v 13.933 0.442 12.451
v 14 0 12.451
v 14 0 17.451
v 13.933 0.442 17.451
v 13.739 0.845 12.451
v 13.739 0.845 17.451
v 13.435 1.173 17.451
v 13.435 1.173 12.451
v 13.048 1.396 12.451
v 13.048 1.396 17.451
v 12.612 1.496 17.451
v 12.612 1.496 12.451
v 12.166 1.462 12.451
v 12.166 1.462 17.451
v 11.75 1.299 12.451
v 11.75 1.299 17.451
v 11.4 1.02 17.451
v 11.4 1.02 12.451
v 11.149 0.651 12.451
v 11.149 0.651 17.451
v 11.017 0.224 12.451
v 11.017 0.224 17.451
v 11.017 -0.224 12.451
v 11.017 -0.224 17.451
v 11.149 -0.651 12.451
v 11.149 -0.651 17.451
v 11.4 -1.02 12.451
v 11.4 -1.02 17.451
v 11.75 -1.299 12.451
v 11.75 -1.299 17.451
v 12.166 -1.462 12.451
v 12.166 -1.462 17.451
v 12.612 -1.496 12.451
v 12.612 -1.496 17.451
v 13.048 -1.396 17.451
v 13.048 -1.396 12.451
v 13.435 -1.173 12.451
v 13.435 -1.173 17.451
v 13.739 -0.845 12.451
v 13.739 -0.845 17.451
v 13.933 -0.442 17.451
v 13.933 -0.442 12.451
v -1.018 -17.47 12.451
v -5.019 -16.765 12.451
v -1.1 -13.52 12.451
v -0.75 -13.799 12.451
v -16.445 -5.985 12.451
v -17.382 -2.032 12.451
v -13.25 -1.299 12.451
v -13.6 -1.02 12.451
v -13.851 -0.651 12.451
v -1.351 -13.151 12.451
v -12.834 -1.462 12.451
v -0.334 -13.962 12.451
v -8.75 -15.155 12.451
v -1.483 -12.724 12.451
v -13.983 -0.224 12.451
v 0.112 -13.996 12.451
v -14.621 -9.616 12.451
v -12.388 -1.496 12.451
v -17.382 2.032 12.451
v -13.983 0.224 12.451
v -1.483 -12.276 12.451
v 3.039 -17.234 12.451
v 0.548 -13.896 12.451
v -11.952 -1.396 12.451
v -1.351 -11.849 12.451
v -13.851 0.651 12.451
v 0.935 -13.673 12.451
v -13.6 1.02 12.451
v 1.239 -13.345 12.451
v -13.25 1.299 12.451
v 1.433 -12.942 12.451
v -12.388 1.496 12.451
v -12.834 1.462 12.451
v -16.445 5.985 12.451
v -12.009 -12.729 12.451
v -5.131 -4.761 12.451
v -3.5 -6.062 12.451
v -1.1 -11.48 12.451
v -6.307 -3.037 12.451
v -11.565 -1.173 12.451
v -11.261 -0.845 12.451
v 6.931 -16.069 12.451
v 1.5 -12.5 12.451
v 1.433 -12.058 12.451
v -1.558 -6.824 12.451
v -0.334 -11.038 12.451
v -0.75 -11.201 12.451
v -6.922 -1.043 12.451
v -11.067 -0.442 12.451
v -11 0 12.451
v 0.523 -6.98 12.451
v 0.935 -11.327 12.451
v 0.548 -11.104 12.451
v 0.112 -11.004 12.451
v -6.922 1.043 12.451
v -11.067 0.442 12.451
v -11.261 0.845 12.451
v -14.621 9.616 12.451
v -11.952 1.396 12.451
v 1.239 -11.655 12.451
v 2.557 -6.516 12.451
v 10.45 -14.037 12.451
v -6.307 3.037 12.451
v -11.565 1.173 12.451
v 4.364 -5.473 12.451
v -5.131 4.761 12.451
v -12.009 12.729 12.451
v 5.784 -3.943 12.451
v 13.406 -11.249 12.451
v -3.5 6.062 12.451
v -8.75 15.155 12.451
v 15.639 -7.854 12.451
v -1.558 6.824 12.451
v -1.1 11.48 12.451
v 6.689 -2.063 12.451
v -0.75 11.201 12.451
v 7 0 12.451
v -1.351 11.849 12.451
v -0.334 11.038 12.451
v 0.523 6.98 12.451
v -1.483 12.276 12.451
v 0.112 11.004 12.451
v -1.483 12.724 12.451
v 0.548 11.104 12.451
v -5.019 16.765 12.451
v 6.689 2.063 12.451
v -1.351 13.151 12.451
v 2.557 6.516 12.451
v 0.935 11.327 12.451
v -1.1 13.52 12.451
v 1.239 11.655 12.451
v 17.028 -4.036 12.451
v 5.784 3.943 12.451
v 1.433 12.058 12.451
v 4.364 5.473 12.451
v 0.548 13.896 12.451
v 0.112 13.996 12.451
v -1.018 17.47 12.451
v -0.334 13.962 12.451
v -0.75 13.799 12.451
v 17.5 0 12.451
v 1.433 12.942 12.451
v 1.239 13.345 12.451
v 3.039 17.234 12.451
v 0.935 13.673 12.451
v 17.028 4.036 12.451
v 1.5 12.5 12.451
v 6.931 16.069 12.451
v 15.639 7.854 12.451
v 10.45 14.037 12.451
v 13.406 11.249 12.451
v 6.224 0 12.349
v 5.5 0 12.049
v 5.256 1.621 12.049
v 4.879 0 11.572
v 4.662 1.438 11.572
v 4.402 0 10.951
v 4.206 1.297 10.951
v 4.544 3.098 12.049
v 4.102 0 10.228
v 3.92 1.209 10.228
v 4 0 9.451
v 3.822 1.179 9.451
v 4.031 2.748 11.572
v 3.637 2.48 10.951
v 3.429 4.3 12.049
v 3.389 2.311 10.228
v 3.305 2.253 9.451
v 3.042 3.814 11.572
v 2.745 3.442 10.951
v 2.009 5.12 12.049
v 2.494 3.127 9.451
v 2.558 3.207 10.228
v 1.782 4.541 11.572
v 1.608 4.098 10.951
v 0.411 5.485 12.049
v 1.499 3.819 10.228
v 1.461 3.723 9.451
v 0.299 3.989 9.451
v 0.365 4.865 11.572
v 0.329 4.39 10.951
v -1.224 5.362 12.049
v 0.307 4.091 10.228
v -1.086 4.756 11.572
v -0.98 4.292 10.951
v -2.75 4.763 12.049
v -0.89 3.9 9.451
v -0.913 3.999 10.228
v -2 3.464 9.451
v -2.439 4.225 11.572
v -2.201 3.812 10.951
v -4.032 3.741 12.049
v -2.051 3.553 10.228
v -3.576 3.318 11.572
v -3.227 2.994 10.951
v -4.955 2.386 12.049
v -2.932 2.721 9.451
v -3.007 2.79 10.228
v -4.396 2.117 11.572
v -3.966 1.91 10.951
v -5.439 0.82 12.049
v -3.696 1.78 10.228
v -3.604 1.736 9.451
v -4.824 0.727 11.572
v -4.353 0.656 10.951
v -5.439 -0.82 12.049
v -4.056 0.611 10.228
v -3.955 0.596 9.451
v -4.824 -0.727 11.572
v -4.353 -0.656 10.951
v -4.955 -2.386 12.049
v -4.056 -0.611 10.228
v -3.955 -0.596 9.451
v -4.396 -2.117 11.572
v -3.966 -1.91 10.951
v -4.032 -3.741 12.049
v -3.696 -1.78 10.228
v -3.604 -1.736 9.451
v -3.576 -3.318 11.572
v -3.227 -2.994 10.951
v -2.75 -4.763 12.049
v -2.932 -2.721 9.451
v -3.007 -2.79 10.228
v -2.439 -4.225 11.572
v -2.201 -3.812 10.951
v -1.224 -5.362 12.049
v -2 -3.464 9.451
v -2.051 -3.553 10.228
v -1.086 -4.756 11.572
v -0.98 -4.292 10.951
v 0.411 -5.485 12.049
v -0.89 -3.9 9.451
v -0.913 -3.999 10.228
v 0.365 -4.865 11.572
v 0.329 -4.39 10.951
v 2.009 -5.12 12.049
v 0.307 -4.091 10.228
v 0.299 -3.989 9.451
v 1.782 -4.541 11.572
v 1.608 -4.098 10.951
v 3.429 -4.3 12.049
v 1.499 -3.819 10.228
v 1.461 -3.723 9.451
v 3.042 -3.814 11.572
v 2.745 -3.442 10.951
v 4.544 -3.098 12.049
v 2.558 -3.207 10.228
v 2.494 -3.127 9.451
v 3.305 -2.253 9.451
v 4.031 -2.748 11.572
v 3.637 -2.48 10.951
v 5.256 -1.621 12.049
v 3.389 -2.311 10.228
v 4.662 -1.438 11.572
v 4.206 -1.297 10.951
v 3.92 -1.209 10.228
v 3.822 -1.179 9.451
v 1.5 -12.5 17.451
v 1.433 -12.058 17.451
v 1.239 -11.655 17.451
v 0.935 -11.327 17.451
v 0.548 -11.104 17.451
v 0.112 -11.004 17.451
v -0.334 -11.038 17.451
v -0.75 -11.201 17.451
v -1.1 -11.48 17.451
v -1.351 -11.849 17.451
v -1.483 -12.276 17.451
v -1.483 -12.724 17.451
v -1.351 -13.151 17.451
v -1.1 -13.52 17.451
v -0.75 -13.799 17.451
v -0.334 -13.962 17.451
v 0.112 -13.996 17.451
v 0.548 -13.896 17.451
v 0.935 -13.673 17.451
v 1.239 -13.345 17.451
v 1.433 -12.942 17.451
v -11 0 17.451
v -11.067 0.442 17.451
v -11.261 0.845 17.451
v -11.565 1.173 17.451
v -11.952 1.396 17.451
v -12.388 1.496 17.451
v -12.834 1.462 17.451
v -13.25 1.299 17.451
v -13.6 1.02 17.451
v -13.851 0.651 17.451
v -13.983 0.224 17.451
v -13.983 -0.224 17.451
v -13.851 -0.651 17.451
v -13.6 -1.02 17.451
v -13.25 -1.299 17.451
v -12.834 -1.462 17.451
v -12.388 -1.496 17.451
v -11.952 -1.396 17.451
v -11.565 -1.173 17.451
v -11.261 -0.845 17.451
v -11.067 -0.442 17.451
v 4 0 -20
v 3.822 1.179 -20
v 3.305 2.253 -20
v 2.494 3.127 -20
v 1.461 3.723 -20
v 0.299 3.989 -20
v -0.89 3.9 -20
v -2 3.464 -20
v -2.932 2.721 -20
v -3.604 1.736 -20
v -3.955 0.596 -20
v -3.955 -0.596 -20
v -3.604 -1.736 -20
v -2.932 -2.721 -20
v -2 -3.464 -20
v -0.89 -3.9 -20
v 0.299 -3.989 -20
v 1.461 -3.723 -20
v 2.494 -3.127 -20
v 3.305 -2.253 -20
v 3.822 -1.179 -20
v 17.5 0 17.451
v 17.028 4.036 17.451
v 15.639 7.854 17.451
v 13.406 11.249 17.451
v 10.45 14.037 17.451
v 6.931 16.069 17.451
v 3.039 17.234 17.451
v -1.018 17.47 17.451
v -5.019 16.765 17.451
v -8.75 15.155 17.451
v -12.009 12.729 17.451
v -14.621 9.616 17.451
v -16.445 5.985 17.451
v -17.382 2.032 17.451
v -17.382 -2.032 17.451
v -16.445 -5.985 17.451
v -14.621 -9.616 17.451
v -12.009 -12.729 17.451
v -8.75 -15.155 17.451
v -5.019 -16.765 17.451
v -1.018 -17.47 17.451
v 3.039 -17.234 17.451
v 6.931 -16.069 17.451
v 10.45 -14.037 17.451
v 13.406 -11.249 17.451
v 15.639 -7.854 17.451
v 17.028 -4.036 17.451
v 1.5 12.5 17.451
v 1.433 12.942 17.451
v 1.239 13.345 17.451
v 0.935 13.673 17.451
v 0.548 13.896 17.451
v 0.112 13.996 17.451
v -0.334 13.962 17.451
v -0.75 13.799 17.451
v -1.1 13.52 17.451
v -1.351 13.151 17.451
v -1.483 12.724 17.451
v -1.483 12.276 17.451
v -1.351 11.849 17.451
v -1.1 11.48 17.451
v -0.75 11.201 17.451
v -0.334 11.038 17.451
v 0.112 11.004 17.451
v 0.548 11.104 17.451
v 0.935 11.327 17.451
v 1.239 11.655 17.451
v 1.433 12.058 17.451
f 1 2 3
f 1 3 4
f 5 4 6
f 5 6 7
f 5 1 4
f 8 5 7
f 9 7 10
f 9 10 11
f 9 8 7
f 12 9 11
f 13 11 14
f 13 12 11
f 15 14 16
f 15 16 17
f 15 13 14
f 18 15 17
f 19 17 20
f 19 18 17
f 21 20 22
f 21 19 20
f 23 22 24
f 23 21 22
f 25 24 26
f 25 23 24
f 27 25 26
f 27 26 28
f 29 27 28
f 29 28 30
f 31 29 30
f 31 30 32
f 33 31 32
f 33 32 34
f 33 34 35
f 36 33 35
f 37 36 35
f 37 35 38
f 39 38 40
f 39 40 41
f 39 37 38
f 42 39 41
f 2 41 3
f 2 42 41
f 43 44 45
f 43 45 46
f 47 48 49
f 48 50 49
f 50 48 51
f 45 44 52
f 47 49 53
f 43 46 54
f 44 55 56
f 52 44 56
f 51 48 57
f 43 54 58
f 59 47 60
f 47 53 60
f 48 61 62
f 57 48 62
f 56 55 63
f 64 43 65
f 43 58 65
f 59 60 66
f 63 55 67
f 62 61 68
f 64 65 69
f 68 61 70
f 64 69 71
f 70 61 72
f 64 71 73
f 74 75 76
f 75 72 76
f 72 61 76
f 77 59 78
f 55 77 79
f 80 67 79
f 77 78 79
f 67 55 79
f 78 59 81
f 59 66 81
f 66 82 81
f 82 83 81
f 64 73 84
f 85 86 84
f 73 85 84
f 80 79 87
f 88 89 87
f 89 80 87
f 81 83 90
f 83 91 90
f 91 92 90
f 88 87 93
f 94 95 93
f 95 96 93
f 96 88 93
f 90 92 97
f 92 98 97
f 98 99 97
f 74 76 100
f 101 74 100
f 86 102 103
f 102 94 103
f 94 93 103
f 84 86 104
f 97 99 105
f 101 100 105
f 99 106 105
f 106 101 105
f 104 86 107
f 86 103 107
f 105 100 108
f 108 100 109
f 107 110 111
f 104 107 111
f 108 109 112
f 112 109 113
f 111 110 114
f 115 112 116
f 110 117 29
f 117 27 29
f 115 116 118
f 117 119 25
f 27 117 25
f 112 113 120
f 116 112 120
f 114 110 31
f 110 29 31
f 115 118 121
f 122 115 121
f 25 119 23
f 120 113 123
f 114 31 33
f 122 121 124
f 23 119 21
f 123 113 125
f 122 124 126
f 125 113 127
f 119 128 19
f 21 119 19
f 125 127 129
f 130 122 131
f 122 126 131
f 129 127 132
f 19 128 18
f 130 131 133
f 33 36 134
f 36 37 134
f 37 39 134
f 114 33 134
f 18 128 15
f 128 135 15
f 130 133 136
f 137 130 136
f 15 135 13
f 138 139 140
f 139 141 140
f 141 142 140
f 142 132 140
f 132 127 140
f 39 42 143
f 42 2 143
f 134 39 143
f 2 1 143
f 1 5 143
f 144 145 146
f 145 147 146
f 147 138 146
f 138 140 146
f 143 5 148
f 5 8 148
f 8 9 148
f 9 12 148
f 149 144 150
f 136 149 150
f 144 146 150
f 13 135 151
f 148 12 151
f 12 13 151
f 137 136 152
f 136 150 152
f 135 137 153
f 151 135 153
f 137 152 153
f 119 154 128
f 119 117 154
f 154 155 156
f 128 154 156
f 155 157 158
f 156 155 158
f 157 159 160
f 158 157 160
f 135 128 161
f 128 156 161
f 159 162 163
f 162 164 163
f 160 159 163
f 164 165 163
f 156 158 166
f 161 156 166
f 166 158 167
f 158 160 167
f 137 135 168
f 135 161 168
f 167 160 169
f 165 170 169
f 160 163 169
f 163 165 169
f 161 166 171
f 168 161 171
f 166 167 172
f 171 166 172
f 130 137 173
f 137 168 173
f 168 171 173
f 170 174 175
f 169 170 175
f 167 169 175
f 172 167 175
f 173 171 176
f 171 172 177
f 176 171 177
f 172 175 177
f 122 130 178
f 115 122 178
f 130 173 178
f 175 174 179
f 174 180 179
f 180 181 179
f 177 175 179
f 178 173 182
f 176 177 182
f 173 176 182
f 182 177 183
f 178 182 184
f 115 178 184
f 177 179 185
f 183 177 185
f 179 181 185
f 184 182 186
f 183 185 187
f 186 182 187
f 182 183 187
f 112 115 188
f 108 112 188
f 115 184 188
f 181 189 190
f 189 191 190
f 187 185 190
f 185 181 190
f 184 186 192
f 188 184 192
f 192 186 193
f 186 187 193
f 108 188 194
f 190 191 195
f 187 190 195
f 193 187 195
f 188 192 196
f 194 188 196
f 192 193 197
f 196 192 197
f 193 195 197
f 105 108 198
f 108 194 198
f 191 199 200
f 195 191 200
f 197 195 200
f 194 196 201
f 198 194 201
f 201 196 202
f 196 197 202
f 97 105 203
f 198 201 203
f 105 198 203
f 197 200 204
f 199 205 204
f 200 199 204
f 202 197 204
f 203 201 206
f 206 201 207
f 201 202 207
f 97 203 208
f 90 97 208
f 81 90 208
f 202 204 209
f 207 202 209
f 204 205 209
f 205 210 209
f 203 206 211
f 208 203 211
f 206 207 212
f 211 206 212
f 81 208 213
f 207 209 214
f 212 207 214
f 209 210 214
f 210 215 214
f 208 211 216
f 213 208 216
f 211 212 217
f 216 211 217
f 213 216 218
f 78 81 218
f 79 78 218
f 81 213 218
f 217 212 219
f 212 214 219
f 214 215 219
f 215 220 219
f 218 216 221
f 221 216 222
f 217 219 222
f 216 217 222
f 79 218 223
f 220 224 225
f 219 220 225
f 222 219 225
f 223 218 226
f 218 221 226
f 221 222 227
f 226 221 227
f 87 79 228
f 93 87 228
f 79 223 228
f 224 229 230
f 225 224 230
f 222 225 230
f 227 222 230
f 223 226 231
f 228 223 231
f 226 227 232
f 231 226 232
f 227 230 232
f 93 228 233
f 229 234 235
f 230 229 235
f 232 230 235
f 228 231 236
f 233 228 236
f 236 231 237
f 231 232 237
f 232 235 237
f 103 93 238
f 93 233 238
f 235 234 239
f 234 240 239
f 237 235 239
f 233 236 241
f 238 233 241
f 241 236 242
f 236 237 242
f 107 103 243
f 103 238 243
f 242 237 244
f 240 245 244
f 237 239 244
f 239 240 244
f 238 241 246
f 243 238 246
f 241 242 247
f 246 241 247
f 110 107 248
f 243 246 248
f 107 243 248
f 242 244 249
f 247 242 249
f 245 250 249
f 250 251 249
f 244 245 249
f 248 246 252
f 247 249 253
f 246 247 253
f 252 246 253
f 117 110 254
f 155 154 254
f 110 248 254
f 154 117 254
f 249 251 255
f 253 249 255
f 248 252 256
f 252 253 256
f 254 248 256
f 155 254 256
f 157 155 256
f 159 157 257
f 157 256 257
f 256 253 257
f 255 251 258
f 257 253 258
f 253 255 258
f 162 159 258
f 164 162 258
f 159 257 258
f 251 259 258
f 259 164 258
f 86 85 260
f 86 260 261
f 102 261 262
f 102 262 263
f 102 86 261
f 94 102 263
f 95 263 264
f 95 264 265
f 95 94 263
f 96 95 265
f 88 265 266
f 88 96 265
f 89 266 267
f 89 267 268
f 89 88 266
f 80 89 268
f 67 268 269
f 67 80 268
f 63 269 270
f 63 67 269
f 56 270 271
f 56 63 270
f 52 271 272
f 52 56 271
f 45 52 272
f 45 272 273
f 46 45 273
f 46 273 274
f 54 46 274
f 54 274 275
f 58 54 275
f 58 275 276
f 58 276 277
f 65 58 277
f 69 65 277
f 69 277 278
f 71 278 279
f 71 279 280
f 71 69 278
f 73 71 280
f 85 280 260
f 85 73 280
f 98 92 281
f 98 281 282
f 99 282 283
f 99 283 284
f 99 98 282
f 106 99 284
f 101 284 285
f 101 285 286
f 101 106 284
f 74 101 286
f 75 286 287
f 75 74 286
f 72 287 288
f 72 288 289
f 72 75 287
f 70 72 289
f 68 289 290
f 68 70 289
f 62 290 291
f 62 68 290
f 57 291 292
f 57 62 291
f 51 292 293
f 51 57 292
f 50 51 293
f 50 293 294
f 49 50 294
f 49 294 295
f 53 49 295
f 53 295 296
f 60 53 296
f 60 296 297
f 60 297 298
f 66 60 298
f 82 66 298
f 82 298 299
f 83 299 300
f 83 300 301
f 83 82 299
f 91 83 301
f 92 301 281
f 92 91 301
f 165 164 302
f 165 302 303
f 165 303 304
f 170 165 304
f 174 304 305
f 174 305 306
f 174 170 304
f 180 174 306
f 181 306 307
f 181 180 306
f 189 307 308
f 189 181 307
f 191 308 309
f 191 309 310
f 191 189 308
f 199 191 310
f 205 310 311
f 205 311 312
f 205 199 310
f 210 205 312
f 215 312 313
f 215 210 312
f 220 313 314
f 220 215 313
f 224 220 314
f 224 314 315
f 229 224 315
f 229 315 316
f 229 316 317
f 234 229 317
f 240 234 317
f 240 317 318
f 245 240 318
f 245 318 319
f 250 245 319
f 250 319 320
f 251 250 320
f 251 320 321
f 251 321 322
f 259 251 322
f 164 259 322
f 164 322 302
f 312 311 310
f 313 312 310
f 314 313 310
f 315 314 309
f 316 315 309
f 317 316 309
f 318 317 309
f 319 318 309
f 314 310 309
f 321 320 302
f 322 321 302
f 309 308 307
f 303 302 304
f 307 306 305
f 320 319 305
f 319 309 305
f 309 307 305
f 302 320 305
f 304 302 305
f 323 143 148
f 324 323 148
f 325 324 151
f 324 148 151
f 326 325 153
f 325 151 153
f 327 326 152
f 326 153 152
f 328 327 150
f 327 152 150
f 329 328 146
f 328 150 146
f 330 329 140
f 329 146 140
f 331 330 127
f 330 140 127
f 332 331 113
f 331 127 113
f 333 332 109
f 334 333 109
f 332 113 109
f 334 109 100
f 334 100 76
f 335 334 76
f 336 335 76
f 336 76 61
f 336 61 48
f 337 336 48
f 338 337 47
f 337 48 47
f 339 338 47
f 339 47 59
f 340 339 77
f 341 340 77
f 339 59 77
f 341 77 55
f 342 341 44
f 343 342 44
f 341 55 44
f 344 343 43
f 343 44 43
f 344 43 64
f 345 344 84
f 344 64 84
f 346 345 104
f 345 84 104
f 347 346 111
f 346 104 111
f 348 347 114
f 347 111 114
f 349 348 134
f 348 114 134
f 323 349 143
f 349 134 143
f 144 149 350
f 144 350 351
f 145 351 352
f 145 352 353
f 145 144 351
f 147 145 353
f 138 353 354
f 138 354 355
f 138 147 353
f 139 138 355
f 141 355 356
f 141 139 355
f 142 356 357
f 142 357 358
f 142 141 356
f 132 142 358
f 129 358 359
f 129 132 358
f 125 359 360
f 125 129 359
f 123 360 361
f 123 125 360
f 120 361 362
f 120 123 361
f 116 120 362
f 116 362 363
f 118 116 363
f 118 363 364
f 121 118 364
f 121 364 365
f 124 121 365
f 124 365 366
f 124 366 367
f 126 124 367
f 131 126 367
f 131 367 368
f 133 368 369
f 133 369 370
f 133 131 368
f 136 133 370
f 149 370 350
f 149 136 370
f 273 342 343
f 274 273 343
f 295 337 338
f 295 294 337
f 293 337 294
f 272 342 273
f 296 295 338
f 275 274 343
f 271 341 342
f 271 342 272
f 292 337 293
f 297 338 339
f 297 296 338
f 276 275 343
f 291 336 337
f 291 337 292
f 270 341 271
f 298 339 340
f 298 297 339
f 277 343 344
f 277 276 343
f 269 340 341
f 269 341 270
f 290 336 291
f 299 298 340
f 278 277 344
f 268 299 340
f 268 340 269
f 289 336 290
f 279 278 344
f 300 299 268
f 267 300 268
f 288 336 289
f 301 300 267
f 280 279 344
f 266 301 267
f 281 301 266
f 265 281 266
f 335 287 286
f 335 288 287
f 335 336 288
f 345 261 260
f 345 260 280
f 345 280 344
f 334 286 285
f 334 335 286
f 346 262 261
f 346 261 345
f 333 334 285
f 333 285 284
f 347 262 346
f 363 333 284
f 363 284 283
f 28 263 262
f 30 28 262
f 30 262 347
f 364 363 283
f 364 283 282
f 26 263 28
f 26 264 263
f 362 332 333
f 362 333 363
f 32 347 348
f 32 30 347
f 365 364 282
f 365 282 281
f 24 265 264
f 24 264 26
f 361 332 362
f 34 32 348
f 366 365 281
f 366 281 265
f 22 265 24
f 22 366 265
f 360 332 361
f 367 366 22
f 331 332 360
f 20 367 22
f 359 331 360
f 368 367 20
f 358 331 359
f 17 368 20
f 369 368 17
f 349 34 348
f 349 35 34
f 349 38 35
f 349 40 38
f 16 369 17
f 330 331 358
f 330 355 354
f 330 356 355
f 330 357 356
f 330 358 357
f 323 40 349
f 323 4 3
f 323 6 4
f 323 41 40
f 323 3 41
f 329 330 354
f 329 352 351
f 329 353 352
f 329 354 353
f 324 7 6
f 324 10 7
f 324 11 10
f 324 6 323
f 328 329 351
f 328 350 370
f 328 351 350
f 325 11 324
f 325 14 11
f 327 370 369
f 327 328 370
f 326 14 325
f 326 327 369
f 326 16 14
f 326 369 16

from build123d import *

# Parameters (mm, degrees)
SKETCH1_R                = 4
BOSS_EXTRUDE1_DEPTH      = 12.451061179
BOSS_EXTRUDE1_DEPTH_BACK = 20
SKETCH3_R                = 17.5
SKETCH3_R_2              = 1.5
BOSS_EXTRUDE2_DEPTH      = 5
FILLET1_R                = 3


with BuildPart() as part:
    # Sketch1 → Boss-Extrude1 (new body, two sides)
    with BuildSketch(Plane.XY) as boss_extrude1_sk:
        Circle(SKETCH1_R)
    extrude(amount=BOSS_EXTRUDE1_DEPTH)
    extrude(boss_extrude1_sk.sketch, amount=-BOSS_EXTRUDE1_DEPTH_BACK)

    # Sketch3 → Boss-Extrude2 (add)
    with BuildSketch(Plane.XY.offset(12.451061179)):
        Circle(SKETCH3_R)
        with Locations((0, 12.5)):
            Circle(SKETCH3_R_2, mode=Mode.SUBTRACT)
        with Locations((12.5, 0)):
            Circle(SKETCH3_R_2, mode=Mode.SUBTRACT)
        with Locations((0, -12.5)):
            Circle(SKETCH3_R_2, mode=Mode.SUBTRACT)
        with Locations((-12.5, 0)):
            Circle(SKETCH3_R_2, mode=Mode.SUBTRACT)
    extrude(amount=BOSS_EXTRUDE2_DEPTH)

    # Fillet1
    fillet1_edges = [part.edges().sort_by_distance(p)[0] for p in [
        (-4, 0, 12.451061179),
    ]]
    fillet(fillet1_edges, radius=FILLET1_R)


solid = part.part
